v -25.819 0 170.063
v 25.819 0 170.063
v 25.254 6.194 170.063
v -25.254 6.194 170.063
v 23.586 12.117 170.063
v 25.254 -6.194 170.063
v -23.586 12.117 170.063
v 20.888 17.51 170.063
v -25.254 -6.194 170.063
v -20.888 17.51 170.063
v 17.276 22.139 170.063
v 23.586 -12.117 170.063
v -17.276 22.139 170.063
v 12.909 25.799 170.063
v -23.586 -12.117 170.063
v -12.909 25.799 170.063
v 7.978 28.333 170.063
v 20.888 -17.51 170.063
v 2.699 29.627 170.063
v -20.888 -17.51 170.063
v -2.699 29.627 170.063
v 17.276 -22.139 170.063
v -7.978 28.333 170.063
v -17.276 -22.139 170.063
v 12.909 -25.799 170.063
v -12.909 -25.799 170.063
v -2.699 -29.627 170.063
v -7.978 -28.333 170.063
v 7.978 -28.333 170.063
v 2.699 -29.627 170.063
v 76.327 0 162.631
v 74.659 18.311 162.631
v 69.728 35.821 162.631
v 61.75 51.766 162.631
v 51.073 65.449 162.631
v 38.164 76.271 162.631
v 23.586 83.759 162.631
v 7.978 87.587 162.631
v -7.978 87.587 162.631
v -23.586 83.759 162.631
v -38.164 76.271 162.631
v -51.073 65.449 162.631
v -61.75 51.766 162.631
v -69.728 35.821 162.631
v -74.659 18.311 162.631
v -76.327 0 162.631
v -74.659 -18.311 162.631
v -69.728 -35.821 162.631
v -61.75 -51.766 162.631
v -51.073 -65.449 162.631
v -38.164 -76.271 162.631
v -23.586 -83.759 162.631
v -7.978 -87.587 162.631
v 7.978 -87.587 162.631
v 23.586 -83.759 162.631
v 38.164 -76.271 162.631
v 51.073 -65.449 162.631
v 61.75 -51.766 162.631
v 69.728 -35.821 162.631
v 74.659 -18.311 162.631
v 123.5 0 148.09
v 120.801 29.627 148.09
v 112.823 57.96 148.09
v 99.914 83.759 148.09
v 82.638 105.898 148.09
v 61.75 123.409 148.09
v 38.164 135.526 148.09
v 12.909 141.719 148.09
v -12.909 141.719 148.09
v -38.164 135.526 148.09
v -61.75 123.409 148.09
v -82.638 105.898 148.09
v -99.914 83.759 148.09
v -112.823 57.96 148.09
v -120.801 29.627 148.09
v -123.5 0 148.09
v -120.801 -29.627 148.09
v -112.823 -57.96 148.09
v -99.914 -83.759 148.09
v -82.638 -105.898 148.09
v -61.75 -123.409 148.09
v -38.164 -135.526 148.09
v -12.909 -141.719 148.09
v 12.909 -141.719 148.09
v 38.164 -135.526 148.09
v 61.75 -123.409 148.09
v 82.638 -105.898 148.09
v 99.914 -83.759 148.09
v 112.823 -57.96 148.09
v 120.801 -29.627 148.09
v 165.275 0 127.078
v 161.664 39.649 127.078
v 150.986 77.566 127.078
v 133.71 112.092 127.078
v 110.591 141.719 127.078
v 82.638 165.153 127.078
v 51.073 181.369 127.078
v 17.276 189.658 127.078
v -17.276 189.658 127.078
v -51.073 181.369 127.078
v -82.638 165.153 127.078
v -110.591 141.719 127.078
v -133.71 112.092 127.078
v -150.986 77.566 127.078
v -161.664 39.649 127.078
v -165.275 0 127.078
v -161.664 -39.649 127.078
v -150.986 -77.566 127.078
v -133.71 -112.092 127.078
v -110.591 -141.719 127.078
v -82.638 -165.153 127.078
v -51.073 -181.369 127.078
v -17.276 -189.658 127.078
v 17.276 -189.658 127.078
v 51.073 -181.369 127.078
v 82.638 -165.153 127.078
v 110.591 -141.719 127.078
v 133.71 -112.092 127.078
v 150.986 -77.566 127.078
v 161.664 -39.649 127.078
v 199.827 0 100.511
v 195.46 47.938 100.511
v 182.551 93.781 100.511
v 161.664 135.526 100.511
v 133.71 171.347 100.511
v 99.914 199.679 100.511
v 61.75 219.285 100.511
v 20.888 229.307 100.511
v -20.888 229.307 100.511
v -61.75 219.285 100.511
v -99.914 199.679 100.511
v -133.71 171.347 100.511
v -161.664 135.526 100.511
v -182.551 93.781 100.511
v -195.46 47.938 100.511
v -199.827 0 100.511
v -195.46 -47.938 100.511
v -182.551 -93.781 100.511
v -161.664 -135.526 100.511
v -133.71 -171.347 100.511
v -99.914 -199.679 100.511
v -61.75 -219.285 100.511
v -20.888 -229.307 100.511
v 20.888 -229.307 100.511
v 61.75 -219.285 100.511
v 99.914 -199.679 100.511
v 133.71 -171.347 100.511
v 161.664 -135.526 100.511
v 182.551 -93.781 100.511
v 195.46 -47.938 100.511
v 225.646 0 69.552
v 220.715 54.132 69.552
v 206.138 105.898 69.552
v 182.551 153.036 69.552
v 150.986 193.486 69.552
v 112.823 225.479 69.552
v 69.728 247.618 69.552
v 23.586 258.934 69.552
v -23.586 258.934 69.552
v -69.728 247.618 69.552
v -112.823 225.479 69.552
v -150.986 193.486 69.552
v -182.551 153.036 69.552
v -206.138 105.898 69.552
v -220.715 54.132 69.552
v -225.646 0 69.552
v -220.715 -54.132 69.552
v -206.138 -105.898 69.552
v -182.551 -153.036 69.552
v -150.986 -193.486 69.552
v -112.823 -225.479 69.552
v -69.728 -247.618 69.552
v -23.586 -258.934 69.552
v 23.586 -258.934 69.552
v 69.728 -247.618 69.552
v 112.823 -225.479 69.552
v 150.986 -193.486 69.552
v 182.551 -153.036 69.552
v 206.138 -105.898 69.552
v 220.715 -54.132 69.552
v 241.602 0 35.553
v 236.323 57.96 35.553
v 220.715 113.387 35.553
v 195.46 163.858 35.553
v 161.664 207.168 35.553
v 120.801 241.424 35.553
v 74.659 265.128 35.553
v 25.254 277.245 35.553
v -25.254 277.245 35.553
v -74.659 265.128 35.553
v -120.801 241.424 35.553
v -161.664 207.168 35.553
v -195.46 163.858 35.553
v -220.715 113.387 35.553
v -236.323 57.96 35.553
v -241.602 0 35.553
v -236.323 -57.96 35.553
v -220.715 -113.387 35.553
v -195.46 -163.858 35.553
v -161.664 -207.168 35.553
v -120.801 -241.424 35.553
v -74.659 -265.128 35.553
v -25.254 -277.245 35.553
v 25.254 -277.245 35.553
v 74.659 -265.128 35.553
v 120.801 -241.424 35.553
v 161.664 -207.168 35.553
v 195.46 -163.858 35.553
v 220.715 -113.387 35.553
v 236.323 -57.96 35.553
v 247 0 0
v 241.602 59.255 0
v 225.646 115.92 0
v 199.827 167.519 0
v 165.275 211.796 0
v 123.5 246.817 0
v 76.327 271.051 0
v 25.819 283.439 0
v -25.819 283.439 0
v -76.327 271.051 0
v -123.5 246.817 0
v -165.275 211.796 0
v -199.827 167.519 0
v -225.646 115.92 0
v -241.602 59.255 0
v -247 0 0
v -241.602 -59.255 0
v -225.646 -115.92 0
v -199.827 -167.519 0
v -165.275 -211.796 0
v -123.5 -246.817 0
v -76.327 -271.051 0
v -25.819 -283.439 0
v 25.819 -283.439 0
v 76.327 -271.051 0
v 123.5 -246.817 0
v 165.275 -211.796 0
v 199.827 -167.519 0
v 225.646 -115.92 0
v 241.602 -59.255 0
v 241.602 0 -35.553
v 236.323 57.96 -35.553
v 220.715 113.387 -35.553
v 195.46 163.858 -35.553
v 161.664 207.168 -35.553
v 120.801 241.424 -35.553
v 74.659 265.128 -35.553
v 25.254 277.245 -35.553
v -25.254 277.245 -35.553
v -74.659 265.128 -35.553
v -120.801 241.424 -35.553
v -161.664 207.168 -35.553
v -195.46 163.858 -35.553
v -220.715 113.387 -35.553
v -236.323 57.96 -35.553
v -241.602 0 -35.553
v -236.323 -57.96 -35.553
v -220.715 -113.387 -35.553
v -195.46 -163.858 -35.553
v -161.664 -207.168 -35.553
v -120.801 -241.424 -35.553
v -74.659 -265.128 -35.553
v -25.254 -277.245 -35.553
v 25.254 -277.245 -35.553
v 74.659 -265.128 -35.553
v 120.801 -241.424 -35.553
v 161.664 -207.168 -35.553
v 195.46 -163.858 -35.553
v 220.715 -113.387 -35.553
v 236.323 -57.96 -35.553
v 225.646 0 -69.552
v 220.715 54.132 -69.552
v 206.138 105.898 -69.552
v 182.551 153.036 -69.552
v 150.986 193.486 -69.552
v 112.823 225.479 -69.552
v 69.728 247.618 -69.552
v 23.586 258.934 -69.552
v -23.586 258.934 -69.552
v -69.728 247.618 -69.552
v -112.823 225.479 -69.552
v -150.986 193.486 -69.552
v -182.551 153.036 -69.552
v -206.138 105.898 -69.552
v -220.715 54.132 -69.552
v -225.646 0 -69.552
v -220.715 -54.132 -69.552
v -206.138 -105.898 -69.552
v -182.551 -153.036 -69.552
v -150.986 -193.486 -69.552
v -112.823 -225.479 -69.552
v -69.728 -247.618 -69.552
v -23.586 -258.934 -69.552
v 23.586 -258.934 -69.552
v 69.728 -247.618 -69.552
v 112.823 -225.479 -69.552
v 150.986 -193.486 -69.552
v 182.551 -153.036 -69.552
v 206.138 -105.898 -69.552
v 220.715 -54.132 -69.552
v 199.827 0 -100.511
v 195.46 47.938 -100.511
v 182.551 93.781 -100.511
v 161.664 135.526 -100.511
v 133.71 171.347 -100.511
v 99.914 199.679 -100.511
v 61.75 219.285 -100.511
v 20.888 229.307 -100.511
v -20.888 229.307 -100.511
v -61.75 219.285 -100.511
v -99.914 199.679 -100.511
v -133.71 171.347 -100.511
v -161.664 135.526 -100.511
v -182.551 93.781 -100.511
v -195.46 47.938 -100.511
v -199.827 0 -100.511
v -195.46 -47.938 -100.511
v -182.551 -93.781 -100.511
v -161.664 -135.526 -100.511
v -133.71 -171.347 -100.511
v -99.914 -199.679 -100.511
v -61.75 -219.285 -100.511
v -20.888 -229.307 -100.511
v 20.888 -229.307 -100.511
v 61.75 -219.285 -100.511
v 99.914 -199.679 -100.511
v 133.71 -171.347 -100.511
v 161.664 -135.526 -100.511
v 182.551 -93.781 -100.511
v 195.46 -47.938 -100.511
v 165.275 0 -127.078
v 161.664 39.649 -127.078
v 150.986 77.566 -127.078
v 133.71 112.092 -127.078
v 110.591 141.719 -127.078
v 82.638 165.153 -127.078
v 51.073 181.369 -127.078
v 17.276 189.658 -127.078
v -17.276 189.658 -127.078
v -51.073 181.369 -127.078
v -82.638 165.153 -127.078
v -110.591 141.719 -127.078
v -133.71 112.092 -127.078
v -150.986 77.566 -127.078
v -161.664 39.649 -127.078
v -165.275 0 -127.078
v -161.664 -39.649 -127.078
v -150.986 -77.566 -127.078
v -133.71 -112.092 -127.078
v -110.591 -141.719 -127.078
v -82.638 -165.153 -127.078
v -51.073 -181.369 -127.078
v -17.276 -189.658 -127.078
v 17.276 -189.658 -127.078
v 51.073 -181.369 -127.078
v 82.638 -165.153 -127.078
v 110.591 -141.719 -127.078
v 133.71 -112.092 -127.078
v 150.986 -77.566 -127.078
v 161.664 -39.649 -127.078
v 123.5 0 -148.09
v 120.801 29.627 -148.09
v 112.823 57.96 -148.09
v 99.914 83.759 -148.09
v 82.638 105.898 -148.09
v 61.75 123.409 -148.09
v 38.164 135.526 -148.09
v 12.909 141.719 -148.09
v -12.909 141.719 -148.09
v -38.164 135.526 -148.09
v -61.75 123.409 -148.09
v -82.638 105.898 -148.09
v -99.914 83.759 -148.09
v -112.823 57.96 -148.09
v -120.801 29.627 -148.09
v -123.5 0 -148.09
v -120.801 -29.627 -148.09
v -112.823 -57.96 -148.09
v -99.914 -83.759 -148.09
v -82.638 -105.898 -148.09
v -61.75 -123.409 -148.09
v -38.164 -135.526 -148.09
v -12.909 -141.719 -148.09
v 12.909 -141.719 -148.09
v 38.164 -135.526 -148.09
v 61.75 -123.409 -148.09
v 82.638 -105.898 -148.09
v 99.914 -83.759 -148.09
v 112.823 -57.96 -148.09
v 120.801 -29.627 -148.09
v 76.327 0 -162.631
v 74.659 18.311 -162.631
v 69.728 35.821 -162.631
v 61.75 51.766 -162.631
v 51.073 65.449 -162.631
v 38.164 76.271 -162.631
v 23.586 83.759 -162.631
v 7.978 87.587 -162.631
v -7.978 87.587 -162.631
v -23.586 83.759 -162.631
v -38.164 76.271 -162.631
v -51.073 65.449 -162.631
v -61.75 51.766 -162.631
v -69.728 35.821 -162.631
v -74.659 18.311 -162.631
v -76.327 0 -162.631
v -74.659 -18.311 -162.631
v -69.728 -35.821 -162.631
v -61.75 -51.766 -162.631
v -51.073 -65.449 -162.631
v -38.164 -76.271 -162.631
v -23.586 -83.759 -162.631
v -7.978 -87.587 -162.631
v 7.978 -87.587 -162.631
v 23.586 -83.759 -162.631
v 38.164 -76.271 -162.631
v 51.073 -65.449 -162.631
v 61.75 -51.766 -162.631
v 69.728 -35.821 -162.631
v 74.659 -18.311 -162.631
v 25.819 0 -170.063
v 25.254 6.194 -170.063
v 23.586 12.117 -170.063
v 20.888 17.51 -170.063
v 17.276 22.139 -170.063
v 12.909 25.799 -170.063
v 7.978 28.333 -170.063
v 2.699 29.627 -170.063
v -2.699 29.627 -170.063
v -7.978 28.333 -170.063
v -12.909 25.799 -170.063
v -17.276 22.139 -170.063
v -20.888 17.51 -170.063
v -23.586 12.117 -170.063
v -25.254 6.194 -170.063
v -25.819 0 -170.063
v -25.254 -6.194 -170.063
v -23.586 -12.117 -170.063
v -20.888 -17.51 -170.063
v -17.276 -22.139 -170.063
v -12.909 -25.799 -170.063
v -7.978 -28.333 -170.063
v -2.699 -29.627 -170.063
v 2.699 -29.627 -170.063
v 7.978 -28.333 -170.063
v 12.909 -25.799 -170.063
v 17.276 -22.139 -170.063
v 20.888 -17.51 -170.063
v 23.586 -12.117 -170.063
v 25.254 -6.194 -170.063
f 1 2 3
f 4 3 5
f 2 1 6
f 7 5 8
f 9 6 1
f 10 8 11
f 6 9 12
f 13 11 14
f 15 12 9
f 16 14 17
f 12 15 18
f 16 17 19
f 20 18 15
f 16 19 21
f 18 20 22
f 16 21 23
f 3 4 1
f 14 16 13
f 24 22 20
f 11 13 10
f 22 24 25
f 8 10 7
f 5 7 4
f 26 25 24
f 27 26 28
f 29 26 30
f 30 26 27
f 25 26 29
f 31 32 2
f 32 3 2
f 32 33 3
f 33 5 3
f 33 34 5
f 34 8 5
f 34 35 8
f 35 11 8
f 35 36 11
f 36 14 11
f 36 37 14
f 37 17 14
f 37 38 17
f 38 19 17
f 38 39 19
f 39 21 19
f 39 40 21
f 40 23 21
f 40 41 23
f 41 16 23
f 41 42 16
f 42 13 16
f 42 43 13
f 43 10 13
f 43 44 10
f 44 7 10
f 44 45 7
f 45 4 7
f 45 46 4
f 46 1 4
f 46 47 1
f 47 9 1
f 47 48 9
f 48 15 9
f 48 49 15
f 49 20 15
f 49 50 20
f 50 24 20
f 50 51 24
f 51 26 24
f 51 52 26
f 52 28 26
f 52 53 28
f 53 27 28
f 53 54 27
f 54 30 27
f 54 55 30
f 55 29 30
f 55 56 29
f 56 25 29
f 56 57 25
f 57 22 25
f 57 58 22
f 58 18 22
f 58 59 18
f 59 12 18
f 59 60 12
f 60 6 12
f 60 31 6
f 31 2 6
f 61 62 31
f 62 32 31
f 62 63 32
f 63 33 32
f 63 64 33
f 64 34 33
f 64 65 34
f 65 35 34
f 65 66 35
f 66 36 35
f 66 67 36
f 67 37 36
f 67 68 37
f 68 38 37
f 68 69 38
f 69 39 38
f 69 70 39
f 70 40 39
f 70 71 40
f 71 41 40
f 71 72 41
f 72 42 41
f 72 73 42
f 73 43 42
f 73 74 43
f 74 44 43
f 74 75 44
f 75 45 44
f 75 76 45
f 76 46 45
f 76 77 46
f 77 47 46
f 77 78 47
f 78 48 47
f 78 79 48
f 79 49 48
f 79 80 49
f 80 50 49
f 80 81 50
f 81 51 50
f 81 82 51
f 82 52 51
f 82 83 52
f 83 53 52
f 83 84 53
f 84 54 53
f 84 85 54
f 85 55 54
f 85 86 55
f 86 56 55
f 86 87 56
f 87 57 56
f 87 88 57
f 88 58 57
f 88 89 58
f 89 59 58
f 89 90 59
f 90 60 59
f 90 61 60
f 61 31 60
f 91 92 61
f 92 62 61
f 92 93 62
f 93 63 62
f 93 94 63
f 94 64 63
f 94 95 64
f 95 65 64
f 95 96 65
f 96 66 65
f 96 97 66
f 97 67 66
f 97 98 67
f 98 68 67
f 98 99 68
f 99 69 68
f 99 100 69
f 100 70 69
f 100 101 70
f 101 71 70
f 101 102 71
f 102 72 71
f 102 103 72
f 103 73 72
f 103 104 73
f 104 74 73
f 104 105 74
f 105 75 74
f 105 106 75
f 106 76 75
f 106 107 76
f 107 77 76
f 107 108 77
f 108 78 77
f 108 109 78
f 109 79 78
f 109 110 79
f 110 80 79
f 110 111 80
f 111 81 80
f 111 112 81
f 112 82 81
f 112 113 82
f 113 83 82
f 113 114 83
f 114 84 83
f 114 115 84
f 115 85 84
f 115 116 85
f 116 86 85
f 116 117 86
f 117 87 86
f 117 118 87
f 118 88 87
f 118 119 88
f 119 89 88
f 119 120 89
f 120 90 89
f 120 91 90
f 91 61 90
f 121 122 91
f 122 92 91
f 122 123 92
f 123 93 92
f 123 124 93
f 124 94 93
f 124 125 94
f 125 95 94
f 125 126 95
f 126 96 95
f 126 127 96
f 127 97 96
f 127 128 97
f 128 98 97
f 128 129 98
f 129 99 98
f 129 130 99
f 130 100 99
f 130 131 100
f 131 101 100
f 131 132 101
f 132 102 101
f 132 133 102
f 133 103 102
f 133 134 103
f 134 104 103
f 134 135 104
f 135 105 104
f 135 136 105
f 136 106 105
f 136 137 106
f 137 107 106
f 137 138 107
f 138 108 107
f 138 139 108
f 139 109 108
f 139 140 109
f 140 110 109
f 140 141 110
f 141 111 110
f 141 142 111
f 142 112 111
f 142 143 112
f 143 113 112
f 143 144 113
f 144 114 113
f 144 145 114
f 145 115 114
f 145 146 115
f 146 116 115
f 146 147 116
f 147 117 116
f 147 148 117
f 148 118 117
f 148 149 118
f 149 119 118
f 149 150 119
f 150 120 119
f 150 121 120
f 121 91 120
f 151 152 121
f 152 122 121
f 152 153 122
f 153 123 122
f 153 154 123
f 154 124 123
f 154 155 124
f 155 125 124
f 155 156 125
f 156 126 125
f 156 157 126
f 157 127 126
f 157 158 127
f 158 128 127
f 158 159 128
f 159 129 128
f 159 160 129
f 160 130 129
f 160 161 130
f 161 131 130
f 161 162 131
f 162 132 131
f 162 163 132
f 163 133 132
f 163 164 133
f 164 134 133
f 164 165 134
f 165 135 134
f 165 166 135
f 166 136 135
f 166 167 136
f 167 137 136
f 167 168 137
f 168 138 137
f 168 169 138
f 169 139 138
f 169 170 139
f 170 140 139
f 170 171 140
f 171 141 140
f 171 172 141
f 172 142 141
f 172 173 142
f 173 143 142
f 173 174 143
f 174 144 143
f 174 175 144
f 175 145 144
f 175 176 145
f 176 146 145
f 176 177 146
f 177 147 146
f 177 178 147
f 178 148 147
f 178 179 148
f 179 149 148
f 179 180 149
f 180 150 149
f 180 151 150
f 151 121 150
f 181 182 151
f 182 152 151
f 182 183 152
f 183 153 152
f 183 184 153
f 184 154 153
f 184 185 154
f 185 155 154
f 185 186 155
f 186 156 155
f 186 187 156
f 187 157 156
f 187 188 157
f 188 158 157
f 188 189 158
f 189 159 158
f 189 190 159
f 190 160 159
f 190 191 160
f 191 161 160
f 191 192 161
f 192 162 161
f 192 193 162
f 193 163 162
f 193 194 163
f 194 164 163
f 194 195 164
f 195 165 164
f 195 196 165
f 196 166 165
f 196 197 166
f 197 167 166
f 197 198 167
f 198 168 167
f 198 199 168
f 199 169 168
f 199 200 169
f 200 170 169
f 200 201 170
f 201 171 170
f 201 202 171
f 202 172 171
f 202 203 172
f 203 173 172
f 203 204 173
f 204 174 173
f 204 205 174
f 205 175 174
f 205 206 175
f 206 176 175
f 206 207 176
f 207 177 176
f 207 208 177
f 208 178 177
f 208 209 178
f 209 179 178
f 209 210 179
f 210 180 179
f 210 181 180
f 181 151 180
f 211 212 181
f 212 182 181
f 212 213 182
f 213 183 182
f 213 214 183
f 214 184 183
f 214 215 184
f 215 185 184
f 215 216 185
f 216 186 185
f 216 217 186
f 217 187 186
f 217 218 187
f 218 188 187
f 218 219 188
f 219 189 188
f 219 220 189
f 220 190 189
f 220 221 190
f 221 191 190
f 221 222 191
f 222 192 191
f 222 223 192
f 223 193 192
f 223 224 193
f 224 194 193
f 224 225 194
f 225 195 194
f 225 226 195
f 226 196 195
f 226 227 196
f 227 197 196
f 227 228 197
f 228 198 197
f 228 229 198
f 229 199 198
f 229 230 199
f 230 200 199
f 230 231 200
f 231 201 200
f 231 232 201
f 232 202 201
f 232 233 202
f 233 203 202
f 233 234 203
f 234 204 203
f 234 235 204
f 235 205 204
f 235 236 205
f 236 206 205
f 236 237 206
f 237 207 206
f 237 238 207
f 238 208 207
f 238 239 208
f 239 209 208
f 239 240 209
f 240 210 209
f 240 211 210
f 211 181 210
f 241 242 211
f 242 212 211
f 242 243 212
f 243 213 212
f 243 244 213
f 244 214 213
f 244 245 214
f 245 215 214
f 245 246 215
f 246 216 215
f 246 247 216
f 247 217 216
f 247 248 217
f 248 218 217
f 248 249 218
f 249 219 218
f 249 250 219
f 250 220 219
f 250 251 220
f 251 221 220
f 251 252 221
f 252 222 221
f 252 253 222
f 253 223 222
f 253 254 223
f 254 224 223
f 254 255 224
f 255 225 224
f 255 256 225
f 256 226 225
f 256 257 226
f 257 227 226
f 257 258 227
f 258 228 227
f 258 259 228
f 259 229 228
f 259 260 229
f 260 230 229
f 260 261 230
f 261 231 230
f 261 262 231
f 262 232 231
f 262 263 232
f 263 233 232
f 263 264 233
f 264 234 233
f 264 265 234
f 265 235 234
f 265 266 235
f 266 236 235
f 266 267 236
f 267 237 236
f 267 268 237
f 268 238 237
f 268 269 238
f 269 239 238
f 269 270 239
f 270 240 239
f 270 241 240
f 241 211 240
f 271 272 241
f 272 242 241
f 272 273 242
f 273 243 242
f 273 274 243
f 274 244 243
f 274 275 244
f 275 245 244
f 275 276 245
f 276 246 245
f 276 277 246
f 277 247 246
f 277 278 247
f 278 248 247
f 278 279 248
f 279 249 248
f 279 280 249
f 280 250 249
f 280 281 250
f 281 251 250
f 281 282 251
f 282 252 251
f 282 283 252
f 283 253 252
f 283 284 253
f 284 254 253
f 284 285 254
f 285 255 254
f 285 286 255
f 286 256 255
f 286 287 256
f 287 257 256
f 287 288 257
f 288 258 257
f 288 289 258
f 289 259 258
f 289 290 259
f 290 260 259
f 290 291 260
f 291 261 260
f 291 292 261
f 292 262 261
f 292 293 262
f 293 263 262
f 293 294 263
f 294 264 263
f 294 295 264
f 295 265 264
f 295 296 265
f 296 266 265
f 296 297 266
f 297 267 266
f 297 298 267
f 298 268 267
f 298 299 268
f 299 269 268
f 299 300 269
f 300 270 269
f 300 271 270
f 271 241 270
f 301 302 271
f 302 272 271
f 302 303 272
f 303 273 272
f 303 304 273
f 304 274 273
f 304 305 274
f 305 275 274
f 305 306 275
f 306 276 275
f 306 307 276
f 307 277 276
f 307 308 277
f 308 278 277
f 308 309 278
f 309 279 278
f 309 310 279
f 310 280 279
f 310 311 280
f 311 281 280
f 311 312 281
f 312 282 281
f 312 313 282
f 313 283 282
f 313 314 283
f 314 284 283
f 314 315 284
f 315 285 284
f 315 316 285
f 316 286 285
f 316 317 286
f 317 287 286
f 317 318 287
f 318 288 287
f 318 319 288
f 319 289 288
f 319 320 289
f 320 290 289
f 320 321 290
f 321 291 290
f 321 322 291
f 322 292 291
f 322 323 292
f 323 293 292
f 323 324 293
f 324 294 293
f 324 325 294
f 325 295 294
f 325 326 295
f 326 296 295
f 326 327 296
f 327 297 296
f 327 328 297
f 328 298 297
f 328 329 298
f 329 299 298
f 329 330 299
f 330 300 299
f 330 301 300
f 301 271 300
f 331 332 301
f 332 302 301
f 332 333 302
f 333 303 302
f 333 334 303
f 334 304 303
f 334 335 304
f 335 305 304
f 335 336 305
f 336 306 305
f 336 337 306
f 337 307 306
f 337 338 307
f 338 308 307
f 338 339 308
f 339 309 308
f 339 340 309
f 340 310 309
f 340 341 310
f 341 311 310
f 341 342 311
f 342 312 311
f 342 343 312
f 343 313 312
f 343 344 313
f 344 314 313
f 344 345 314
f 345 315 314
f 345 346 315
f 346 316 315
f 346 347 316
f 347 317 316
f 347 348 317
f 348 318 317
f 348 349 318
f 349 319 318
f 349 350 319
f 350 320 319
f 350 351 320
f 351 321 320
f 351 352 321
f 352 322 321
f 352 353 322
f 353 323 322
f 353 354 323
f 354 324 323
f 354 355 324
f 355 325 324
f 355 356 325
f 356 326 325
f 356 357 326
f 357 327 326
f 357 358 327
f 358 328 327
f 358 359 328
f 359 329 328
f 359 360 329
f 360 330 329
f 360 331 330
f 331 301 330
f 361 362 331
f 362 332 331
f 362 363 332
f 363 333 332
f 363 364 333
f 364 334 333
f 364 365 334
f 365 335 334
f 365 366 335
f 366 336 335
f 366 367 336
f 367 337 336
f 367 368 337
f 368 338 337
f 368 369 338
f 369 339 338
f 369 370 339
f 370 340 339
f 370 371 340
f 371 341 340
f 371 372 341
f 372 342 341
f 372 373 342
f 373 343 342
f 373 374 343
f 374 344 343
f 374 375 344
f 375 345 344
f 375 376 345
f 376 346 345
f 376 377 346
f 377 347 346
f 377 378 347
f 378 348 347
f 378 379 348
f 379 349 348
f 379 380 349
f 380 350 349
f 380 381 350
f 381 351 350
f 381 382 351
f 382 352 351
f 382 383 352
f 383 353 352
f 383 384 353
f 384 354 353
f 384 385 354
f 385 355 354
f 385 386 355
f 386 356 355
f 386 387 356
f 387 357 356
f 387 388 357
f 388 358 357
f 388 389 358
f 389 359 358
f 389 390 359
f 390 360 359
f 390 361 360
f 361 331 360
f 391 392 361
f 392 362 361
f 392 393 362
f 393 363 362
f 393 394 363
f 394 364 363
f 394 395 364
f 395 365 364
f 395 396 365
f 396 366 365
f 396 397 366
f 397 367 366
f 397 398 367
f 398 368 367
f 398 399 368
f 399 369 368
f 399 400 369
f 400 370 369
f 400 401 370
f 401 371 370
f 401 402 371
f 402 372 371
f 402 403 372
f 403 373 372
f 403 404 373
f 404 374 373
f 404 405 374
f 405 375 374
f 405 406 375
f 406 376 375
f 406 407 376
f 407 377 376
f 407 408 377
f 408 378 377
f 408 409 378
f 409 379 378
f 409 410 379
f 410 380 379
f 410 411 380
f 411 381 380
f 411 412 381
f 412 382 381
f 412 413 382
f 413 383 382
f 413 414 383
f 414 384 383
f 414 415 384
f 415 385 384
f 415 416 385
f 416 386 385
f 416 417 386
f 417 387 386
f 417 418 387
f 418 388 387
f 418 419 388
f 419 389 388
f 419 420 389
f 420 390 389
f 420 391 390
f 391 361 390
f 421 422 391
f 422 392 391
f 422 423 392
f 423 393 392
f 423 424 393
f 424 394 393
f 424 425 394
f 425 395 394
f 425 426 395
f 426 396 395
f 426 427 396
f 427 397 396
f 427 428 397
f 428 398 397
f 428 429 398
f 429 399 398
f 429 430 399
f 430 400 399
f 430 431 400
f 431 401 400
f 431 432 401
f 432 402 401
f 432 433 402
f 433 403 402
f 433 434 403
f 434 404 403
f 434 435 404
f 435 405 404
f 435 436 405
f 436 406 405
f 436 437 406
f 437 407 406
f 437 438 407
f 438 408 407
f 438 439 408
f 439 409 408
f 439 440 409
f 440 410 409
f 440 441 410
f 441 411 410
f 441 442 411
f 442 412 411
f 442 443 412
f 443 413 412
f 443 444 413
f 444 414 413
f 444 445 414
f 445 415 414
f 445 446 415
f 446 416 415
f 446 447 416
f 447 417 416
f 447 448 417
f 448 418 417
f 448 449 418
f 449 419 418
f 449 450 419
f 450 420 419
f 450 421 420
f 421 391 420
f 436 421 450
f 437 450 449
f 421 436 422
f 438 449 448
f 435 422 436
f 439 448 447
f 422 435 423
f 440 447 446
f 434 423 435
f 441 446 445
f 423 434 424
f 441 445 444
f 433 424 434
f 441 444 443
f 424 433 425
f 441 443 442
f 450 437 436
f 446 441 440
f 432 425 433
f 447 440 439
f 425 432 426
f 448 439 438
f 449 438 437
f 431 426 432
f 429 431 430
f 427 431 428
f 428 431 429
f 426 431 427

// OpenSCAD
// Generated by SolidPython 1.0.1 on 2020-07-29 00:46:51


scale(v = [13, 15, 9]) {
	sphere(r = 19);
}
/***********************************************
*********      SolidPython code:      **********
************************************************
 
# import packages: SolidPython
from solid import *
from solid.utils import *
from itertools import chain, combinations, permutations


class Resize:

    def __init__(self, scad_file):
        self.scad_file = scad_file
        #self.scad_file = import_scad(scad_file)
        # cone/cylinder param:
        self.r1 = 0
        self.r2 = 0
        self.h = 0
        # rectangular prism param:
        self.w = 0
        self.l = 0
        # ellipse param:
        self.r = 0

    # import OpenScad code (file name corresponds to shape)


    # classify shape + parameters
    def assign(self, param1, param2, param3):
        if self.scad_file == 'cone.scad':
            self.r1 = param1
            self.r2 = param2
            self.h = param3
        elif self.scad_file == 'cylinder.scad':
            self.r1 = param1
            self.r2 = param2
            self.h = param3
        elif self.scad_file == 'rectangularPrism.scad':
            self.h = param1
            self.l = param2
            self.w = param3
        else:
            self.r = param1
            self.h = param2

    # resize parameters
    def iterate(self):
        x = range(3, 20, 2)
        i = 1
        if self.scad_file == 'cone.scad':
            tempList = list(permutations(x, 2))
            for temp in tempList:
                param1 = temp[0]
                param2 = temp[1]
                filepath = 'produced_scad_files/' + 'cone' + str(param1) + '_' + str(param2) + '_' + '.scad'
                scad_render_to_file(cylinder(h=param1, r1=param2, r2=0), filepath)

        elif self.scad_file == 'cylinder.scad':
            tempList = list(permutations(x, 3))
            for temp in tempList:
                param1 = temp[0]
                param2 = temp[1]
                filepath = 'produced_scad_files/' + 'cylinder' + str(param1) + '_' + str(param2) + '_' + '.scad'
                scad_render_to_file(cylinder(h=param1, r1=param2, r2=param2), filepath)

        elif self.scad_file == 'rectangularPrism.scad':
            tempList = list(permutations(x, 3))
            for temp in tempList:
                param1 = temp[0]
                param2 = temp[1]
                param3 = temp[2]
                filepath = 'produced_scad_files/' + 'rectangularPrism' + str(param1) + '_' + str(param2) + '_' + str(
                    param3) + '.scad'
                scad_render_to_file(cube(size=(param1, param2, param3)), filepath)

        elif self.scad_file == 'ellipse.scad':
            tempList = list(permutations(x, 4))
            for temp in tempList:
                param1 = temp[0]
                param2 = temp[1]
                param3 = temp[2]
                param4 = temp[3]
                filepath = 'produced_scad_files/' + 'ellipse' + str(param1) + '_' + str(param2) + '_' + str(param3) + '_' + str(param4) + '.scad'
                scad_render_to_file(scale([param1, param2, param3])(sphere(r=param4)), filepath)

    def render_to_scadfile(self):
        scad_render_to_file(scad, 'example.scad') 
 
************************************************/
